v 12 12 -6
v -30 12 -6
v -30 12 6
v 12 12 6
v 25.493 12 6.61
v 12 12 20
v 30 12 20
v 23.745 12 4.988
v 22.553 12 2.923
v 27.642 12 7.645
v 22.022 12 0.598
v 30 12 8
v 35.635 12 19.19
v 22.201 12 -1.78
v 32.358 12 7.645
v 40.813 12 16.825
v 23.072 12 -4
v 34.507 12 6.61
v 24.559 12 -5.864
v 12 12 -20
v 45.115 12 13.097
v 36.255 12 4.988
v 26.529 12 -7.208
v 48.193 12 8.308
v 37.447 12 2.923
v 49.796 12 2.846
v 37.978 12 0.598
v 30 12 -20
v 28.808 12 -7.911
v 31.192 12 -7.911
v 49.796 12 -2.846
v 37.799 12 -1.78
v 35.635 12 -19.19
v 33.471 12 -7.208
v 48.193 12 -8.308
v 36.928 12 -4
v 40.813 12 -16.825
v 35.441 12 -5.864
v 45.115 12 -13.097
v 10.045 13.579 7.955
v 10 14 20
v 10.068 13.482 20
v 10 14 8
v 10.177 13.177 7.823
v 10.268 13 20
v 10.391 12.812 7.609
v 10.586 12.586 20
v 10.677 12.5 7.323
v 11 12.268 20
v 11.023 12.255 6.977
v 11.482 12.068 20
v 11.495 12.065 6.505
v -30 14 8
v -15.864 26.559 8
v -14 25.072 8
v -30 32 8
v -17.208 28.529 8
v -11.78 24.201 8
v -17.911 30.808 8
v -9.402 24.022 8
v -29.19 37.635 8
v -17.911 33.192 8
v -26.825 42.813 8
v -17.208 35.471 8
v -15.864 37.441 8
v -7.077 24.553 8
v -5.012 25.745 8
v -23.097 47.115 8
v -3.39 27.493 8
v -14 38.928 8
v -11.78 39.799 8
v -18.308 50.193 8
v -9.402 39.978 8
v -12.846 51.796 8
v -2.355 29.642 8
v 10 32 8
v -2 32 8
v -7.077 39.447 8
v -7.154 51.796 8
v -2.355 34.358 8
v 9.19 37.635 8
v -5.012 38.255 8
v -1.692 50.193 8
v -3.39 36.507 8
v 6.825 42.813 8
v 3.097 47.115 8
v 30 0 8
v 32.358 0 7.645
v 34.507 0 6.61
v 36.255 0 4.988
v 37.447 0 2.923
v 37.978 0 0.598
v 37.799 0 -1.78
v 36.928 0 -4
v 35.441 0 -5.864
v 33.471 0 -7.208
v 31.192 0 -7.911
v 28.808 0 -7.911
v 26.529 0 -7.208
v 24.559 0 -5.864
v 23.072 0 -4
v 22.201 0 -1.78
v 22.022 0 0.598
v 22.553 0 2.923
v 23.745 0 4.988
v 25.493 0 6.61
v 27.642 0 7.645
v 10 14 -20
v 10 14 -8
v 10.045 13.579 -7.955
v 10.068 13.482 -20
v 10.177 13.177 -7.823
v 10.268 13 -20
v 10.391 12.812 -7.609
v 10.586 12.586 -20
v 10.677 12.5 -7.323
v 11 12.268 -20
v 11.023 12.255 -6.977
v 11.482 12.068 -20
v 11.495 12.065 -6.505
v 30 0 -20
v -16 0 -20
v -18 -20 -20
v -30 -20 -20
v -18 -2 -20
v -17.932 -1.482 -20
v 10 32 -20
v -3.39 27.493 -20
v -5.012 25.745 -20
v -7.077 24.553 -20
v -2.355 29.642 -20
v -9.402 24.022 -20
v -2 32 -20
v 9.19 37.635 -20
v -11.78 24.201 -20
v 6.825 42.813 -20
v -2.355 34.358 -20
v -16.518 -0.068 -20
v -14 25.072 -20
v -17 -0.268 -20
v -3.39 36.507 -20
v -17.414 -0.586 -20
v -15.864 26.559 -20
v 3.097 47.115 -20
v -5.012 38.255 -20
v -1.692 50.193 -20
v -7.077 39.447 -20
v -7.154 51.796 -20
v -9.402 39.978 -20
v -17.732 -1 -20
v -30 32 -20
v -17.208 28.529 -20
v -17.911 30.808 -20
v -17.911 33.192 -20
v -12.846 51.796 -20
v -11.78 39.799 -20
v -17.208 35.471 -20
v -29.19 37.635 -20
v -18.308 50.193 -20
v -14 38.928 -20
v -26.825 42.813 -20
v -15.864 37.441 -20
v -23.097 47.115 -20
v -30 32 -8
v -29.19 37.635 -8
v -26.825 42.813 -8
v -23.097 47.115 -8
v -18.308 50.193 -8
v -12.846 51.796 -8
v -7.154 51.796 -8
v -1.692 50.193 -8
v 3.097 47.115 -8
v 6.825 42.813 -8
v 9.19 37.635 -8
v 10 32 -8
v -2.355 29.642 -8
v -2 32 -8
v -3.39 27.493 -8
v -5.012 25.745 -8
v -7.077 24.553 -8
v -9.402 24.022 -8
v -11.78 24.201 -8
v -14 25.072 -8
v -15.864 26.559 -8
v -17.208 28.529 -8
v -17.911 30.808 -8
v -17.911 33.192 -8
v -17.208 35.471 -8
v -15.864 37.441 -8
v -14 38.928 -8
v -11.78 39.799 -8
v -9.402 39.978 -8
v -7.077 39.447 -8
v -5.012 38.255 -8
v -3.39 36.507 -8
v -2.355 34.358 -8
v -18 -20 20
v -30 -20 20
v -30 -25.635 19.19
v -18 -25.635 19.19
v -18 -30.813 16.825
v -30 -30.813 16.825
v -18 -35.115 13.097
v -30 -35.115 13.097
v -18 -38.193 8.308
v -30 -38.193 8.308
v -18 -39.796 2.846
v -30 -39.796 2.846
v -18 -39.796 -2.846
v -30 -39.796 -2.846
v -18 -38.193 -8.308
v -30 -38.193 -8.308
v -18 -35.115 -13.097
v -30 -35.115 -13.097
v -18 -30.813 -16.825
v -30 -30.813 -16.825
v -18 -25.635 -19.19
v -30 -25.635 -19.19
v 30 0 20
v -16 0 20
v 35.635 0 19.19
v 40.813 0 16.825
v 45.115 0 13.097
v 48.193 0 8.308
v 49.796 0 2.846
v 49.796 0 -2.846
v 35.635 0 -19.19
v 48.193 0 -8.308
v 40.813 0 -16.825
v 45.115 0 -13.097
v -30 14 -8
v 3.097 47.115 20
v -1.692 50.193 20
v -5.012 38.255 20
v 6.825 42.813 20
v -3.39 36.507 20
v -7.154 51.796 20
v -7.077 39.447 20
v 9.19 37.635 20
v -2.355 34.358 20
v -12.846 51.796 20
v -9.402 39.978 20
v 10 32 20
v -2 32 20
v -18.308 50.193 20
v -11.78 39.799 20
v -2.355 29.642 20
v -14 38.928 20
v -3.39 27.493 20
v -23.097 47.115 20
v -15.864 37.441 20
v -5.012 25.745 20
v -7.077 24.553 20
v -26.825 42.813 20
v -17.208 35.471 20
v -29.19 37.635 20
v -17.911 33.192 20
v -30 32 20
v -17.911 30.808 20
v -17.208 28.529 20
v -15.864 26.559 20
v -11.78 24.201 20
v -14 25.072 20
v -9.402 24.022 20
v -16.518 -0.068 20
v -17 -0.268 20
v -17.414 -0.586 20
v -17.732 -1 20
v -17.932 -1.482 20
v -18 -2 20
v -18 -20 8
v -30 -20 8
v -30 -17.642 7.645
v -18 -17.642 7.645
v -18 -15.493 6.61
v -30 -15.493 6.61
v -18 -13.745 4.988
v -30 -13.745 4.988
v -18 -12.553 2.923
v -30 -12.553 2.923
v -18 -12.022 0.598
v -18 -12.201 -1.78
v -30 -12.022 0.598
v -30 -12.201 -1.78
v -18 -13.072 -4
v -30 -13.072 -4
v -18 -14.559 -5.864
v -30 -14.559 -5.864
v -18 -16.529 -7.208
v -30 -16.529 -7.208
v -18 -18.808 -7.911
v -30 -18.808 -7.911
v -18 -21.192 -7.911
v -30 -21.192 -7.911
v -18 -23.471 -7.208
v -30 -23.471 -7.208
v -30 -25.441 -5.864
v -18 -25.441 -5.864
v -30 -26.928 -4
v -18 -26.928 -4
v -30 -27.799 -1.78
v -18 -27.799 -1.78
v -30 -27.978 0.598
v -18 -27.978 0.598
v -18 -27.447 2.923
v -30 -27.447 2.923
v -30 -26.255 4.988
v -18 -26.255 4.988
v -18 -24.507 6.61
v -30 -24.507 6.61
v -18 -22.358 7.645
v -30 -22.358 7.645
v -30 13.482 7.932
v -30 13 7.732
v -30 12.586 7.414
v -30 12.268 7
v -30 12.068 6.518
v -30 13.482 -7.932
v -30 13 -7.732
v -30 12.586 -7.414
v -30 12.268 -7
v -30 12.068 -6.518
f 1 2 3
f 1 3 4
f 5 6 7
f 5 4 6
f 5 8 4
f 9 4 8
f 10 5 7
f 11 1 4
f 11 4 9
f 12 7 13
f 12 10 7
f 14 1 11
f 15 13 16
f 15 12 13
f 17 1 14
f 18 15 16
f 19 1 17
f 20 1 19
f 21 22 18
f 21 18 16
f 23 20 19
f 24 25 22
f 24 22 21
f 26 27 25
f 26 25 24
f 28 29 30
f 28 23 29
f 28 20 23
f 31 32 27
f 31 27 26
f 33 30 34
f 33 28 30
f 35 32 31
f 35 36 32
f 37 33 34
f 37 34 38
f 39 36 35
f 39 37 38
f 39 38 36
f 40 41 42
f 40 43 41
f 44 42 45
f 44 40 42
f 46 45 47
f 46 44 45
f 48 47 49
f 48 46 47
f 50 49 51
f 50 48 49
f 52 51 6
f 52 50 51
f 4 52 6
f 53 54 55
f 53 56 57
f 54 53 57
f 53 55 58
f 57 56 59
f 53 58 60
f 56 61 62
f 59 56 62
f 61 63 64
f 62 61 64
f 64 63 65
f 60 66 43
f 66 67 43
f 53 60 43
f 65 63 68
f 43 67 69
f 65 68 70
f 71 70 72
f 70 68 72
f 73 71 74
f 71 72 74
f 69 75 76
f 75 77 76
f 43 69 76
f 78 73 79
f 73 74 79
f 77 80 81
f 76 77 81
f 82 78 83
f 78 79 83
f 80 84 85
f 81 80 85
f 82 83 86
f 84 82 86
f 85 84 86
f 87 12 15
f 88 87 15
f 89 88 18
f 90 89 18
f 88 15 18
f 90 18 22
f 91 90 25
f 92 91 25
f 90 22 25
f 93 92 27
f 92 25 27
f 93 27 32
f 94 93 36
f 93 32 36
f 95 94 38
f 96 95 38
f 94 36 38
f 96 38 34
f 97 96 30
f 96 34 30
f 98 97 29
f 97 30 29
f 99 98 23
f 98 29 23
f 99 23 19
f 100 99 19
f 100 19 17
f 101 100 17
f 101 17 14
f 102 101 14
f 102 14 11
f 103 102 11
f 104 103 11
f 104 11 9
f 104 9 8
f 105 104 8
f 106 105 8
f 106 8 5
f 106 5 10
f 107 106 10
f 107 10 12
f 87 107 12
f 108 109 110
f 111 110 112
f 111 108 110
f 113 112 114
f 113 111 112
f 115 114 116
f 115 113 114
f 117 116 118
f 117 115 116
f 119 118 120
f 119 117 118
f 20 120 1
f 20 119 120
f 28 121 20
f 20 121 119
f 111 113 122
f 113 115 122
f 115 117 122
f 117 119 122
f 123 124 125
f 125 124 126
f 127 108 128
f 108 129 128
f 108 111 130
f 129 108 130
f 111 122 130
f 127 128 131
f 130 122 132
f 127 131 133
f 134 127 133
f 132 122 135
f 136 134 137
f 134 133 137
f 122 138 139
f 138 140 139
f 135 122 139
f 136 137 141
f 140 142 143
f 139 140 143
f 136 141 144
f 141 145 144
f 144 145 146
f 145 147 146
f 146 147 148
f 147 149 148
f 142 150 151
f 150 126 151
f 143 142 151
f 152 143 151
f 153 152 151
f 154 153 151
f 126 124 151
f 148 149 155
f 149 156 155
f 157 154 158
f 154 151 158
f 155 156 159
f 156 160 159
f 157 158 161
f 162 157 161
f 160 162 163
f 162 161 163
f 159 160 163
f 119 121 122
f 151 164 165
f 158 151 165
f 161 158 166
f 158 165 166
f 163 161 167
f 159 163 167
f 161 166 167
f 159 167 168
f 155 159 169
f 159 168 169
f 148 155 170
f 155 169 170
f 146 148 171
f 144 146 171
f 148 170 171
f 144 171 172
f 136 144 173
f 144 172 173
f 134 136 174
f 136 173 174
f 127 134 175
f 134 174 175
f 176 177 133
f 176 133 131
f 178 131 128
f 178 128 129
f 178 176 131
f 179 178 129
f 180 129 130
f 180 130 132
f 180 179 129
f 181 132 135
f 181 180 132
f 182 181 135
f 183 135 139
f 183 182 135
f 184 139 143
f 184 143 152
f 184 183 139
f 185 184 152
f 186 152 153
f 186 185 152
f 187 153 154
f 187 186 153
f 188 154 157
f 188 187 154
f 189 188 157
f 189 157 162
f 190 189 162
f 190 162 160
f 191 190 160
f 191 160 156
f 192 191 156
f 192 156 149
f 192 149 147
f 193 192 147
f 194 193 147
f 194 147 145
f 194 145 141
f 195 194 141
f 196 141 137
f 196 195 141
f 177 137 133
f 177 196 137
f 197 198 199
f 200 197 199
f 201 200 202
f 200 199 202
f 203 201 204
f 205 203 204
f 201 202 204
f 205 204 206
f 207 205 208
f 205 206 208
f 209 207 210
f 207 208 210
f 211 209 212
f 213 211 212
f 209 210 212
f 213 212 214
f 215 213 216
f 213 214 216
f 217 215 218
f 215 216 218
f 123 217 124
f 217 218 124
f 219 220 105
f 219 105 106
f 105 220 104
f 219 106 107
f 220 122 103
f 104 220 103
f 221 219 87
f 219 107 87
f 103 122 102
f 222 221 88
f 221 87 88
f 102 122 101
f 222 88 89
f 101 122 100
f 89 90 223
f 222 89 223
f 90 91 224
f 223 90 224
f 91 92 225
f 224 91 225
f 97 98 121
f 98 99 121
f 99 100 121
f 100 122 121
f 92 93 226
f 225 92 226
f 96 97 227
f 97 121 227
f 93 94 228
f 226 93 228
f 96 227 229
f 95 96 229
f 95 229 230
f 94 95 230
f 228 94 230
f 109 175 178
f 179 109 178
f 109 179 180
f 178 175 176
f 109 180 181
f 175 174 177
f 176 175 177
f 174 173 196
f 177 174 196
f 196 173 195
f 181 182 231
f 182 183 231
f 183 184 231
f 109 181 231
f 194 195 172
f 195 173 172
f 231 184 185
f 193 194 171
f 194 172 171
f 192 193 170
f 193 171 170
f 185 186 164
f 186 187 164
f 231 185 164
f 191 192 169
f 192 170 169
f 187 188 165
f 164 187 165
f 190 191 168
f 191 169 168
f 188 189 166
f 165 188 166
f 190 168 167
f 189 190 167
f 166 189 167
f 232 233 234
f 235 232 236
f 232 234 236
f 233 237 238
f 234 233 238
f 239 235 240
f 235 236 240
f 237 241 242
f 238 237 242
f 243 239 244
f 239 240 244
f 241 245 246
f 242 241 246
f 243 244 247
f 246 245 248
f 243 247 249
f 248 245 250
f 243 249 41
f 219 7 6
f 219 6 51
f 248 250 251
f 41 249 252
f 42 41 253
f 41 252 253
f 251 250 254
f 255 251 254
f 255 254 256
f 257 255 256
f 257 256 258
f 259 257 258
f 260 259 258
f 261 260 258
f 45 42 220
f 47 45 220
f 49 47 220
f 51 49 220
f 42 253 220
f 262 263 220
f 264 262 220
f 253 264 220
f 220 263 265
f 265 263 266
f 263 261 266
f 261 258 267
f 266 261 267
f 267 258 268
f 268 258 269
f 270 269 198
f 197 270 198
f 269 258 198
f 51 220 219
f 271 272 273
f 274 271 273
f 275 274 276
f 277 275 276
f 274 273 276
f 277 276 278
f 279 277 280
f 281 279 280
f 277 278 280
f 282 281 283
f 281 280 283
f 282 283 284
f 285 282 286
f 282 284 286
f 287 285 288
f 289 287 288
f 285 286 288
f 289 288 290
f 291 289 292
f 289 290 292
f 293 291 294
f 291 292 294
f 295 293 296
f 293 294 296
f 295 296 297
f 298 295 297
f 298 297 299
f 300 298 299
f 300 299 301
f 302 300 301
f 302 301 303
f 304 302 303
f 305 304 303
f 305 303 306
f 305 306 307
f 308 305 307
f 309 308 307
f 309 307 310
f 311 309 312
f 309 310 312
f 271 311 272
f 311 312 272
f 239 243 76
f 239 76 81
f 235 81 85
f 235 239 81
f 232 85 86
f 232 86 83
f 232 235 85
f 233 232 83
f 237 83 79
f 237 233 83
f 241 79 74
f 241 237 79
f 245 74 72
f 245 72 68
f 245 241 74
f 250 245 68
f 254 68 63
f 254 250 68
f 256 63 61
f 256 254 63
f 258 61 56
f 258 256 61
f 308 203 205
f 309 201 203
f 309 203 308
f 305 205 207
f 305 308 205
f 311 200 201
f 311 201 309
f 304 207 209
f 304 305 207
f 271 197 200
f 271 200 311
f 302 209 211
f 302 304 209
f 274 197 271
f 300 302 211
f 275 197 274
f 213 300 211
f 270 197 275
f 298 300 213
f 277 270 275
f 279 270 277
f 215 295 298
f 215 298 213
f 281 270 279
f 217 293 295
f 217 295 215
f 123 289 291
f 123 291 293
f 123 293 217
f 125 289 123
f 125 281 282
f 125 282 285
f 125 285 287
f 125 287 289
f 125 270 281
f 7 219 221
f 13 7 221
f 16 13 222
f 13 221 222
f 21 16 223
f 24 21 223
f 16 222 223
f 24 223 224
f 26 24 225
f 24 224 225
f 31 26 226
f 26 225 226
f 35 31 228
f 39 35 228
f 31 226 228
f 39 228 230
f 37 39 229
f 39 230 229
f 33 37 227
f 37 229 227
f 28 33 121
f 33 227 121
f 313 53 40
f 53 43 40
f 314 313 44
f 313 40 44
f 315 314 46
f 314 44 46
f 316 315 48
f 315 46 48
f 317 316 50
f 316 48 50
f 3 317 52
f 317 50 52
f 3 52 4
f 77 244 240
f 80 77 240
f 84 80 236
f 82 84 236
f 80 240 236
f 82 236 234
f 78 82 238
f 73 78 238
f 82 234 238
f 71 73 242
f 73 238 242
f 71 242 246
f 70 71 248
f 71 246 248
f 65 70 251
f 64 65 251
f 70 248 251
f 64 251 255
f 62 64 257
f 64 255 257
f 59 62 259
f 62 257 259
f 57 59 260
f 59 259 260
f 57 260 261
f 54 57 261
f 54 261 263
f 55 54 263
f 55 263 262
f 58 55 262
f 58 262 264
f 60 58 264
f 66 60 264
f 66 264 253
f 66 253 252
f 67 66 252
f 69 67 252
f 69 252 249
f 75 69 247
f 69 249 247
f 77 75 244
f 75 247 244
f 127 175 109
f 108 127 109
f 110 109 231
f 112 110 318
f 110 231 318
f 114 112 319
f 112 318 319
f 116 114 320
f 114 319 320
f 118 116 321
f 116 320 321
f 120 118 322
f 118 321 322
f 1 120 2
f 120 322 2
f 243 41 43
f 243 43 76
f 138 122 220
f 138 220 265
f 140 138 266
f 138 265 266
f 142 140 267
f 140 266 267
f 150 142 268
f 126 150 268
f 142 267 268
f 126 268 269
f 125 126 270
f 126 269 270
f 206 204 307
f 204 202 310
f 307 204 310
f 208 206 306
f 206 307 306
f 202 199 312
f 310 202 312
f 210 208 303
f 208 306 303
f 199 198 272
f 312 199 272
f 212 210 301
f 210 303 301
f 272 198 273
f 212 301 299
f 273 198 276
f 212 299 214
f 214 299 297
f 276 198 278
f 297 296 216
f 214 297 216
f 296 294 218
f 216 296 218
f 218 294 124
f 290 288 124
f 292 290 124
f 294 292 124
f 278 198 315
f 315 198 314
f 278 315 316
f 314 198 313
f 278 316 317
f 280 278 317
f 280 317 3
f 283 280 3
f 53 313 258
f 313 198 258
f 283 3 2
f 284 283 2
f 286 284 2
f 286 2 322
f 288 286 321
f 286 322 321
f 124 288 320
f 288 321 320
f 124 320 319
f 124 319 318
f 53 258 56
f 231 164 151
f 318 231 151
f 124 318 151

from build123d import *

# Parameters (mm, degrees)
BOSS_EXTRUDE1_DEPTH = 12
SKETCH2_R           = 8
CUT_EXTRUDE1_DEPTH  = 56.172456897
SKETCH3_R           = 8
BOSS_EXTRUDE2_DEPTH = 12
BOSS_EXTRUDE3_START = -12
SKETCH4_R           = 8
BOSS_EXTRUDE3_DEPTH = 12
SKETCH5_R           = 8
BOSS_EXTRUDE4_DEPTH = 12
FILLET1_R           = 2


with BuildPart() as part:
    # Sketch1 → Boss-Extrude1 (new body)
    with BuildSketch(Plane(origin=(0, 0, 0), x_dir=(1, 0, 0), z_dir=(0, 1, 0))):
        with BuildLine():
            Line((-30, 20), (-30, -20))
            Line((-30, -20), (30, -20))
            ThreePointArc((30, -20), (50, 0), (30, 20))
            Line((30, 20), (-30, 20))
        make_face()
    extrude(amount=BOSS_EXTRUDE1_DEPTH)

    # Sketch2 → Cut-Extrude1 (cut, through all)
    with BuildSketch(Plane(origin=(0, 12, 0), x_dir=(1, 0, 0), z_dir=(0, 1, 0))):
        with Locations(Location((30, 0, 0), (0, 0, 270))):
            Circle(SKETCH2_R)
    extrude(amount=-CUT_EXTRUDE1_DEPTH, mode=Mode.SUBTRACT)

    # Sketch3 → Boss-Extrude2 (add)
    with BuildSketch(Plane.XY.offset(20)):
        with BuildLine():
            Line((-30, 32), (-30, 12))
            Line((-30, 12), (10, 12))
            Line((10, 12), (10, 32))
            ThreePointArc((10, 32), (-10, 52), (-30, 32))
        make_face()
        with Locations((-10, 32)):
            Circle(SKETCH3_R, mode=Mode.SUBTRACT)
    extrude(amount=-BOSS_EXTRUDE2_DEPTH)

    # Sketch4 → Boss-Extrude3 (add)
    with BuildSketch(Plane(origin=(0, 0, -20), x_dir=(-1, 0, 0), z_dir=(0, 0, -1)).offset(BOSS_EXTRUDE3_START)):
        with BuildLine():
            Line((-10, 32), (-10, 12))
            Line((-10, 12), (30, 12))
            Line((30, 12), (30, 32))
            ThreePointArc((30, 32), (10, 52), (-10, 32))
        make_face()
        with Locations(Location((10, 32, 0), (0, 0, 180))):
            Circle(SKETCH4_R, mode=Mode.SUBTRACT)
    extrude(amount=BOSS_EXTRUDE3_DEPTH)

    # Sketch5 → Boss-Extrude4 (add)
    with BuildSketch(Plane.ZY.offset(30)):
        with BuildLine():
            Line((-20, -20), (-20, 0))
            Line((-20, 0), (20, 0))
            Line((20, 0), (20, -20))
            ThreePointArc((20, -20), (0, -40), (-20, -20))
        make_face()
        with Locations((0, -20)):
            Circle(SKETCH5_R, mode=Mode.SUBTRACT)
    extrude(amount=-BOSS_EXTRUDE4_DEPTH)

    # Fillet1
    fillet1_edges = [part.edges().sort_by_distance(p)[0] for p in [
        (-10, 12, 8),
        (10, 12, 14),
        (-10, 12, -8),
        (10, 12, -14),
        (-18, 0, 0),
    ]]
    fillet(fillet1_edges, radius=FILLET1_R)


solid = part.part
